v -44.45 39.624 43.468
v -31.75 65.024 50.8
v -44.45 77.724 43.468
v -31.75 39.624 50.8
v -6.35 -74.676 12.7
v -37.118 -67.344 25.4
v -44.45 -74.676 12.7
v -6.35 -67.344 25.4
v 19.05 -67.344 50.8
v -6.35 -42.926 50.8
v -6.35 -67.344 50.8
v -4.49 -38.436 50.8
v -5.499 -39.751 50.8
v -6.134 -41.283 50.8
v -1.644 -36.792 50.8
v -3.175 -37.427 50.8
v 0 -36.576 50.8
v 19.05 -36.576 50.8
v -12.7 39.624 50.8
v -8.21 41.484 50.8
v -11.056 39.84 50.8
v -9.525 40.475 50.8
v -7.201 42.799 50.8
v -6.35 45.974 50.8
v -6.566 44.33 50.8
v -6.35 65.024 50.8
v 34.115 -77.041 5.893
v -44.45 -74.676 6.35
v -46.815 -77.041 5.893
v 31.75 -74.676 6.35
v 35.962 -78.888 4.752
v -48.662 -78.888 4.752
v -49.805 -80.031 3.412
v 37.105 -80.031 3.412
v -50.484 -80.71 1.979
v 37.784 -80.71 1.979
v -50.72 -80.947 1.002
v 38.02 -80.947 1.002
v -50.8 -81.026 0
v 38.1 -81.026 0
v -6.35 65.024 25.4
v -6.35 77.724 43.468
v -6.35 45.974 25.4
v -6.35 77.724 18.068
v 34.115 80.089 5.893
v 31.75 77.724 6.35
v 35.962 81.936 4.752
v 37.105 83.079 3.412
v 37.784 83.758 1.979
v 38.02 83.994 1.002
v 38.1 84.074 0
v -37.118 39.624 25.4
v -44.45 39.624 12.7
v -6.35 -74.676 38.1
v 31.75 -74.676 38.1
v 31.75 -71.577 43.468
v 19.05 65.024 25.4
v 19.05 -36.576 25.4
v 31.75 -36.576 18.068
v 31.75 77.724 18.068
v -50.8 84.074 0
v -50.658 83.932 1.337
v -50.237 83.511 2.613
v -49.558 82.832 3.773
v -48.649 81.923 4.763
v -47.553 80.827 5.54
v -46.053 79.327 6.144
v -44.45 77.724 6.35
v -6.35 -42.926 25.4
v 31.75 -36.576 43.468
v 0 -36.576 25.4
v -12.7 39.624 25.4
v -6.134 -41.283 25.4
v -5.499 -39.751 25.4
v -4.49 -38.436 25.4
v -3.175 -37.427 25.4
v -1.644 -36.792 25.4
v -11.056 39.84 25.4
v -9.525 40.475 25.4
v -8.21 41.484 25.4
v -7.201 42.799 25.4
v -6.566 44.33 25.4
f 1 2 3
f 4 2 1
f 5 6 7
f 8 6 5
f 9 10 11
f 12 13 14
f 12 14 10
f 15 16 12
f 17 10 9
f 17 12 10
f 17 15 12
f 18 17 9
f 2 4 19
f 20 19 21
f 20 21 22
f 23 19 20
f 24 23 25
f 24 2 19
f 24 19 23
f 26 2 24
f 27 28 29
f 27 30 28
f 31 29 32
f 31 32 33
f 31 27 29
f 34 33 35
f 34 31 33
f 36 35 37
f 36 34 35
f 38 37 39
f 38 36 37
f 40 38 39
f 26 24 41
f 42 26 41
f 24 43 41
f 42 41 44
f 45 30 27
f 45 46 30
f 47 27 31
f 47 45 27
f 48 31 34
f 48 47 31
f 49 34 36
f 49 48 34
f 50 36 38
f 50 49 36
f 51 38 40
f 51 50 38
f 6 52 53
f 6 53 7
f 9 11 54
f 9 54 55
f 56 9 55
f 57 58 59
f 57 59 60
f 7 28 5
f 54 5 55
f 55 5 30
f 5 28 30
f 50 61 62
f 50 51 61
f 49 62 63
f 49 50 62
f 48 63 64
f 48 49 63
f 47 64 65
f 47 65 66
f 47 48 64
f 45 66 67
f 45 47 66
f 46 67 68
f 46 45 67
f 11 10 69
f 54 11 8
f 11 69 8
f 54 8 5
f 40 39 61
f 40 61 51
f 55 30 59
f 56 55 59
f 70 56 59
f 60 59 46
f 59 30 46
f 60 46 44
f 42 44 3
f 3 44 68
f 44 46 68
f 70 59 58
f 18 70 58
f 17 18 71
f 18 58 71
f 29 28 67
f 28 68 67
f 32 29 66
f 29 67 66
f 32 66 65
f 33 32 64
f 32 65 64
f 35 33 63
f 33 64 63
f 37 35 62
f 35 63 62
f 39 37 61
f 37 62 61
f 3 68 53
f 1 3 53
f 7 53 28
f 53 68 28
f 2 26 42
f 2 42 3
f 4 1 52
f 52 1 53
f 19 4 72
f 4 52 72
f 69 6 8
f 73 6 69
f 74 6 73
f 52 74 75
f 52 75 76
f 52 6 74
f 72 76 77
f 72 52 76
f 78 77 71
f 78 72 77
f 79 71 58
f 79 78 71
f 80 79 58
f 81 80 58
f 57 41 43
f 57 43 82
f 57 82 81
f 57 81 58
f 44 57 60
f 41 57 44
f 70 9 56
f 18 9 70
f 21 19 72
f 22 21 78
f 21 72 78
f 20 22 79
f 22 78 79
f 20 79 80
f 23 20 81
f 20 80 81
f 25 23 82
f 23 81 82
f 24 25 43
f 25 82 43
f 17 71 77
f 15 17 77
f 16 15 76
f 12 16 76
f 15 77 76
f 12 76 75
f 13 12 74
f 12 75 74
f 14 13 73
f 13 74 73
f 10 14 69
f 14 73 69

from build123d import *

# Parameters (mm, degrees)
F0_W        = 88.9
F0_H        = 165.1
F1_DEPTH    = 6.35
F2_DEPTH    = 25.4
F3_DEPTH    = 50.8
F4_R        = 6.34999
F5_C1_SIZE2 = 12.7
F5_C1_SIZE  = 7.3323484187
F5_C2_SIZE2 = 12.7
F5_C2_SIZE  = 7.3323484187
F5_C3_SIZE2 = 12.7
F5_C3_SIZE  = 7.3323484187
F5_C4_SIZE2 = 12.7
F5_C4_SIZE  = 7.3323484187
F5_C5_SIZE2 = 7.3323484187
F5_C5_SIZE  = 12.7
F5_C6_SIZE2 = 7.3323484187
F5_C6_SIZE  = 12.7
F5_C7_SIZE2 = 12.7
F5_C7_SIZE  = 7.3323484187
F5_C8_SIZE2 = 7.3323484187
F5_C8_SIZE  = 12.7


# Not quite as in the source:
# - a fillet or chamfer is up to 0.001 mm smaller than in the source, because OpenCascade refuses the exact size


with BuildPart() as f1:
    # F0 (on Top) → F1 (new body)
    with BuildSketch(Plane.XY):
        with Locations((-6.35, 1.5239301443)):
            Rectangle(F0_W, F0_H)
        Polygon((-44.45, 39.6239301443), (-44.45, 77.7239301443), (-6.35, 77.7239301443), (31.75, 77.7239301443), (31.75, -36.5760698557), (31.75, -74.6760698557), (-6.35, -74.6760698557), (-44.45, -74.6760698557), align=None, mode=Mode.SUBTRACT)
        with BuildLine():
            Line((31.75, 77.7239301443), (-6.35, 77.7239301443))
            Line((-6.35, 77.7239301443), (-6.35, 45.9739301443))
            ThreePointArc((-6.35, 45.9739301443), (-8.2098719395, 41.4838020838), (-12.7, 39.6239301443))
            Line((-12.7, 39.6239301443), (-44.45, 39.6239301443))
            Line((-44.45, 39.6239301443), (-44.45, -74.6760698557))
            Line((-44.45, -74.6760698557), (-6.35, -74.6760698557))
            Line((-6.35, -74.6760698557), (-6.35, -42.9260698557))
            ThreePointArc((-6.35, -42.9260698557), (-4.4901280605, -38.4359417952), (0, -36.5760698557))
            Line((0, -36.5760698557), (31.75, -36.5760698557))
            Line((31.75, -36.5760698557), (31.75, 77.7239301443))
        make_face()
        with BuildLine():
            Line((-6.35, 77.7239301443), (-44.45, 77.7239301443))
            Line((-44.45, 77.7239301443), (-44.45, 39.6239301443))
            Line((-44.45, 39.6239301443), (-12.7, 39.6239301443))
            ThreePointArc((-12.7, 39.6239301443), (-8.2098719395, 41.4838020838), (-6.35, 45.9739301443))
            Line((-6.35, 45.9739301443), (-6.35, 77.7239301443))
        make_face()
        with BuildLine():
            Line((31.75, -74.6760698557), (31.75, -36.5760698557))
            Line((31.75, -36.5760698557), (0, -36.5760698557))
            ThreePointArc((0, -36.5760698557), (-4.4901280605, -38.4359417952), (-6.35, -42.9260698557))
            Line((-6.35, -42.9260698557), (-6.35, -74.6760698557))
            Line((-6.35, -74.6760698557), (31.75, -74.6760698557))
        make_face()
    extrude(amount=F1_DEPTH)

    # F0 (on Top) → F2 (join)
    with BuildSketch(Plane.XY):
        with BuildLine():
            Line((31.75, 77.7239301443), (-6.35, 77.7239301443))
            Line((-6.35, 77.7239301443), (-6.35, 45.9739301443))
            ThreePointArc((-6.35, 45.9739301443), (-8.2098719395, 41.4838020838), (-12.7, 39.6239301443))
            Line((-12.7, 39.6239301443), (-44.45, 39.6239301443))
            Line((-44.45, 39.6239301443), (-44.45, -74.6760698557))
            Line((-44.45, -74.6760698557), (-6.35, -74.6760698557))
            Line((-6.35, -74.6760698557), (-6.35, -42.9260698557))
            ThreePointArc((-6.35, -42.9260698557), (-4.4901280605, -38.4359417952), (0, -36.5760698557))
            Line((0, -36.5760698557), (31.75, -36.5760698557))
            Line((31.75, -36.5760698557), (31.75, 77.7239301443))
        make_face()
    extrude(amount=F2_DEPTH)

    # F0 (on Top) → F3 (join)
    with BuildSketch(Plane.XY):
        with BuildLine():
            Line((-6.35, 77.7239301443), (-44.45, 77.7239301443))
            Line((-44.45, 77.7239301443), (-44.45, 39.6239301443))
            Line((-44.45, 39.6239301443), (-12.7, 39.6239301443))
            ThreePointArc((-12.7, 39.6239301443), (-8.2098719395, 41.4838020838), (-6.35, 45.9739301443))
            Line((-6.35, 45.9739301443), (-6.35, 77.7239301443))
        make_face()
        with BuildLine():
            Line((31.75, -74.6760698557), (31.75, -36.5760698557))
            Line((31.75, -36.5760698557), (0, -36.5760698557))
            ThreePointArc((0, -36.5760698557), (-4.4901280605, -38.4359417952), (-6.35, -42.9260698557))
            Line((-6.35, -42.9260698557), (-6.35, -74.6760698557))
            Line((-6.35, -74.6760698557), (31.75, -74.6760698557))
        make_face()
    extrude(amount=F3_DEPTH)

    # F4 (radius 6.35 in the source; OpenCascade refuses exactly that, so slightly less here)
    f4_edges = [f1.edges().sort_by_distance(p)[0] for p in [
        (38.1, 1.52393, 6.35),
        (-6.35, -81.02607, 6.35),
        (-6.35, 84.07393, 6.35),
        (-50.8, 1.52393, 6.35),
    ]]
    fillet(f4_edges, radius=F4_R)

    # F5: chamfer of 12.7 x 7.3323484187 on 8 edges, made by hand

    # F5_c1
    f5_c1_edges = [f1.edges().sort_by_distance(p)[0] for p in [
        (12.7, 77.7239301443, 25.4),
    ]]
    f5_c1_side = f1.faces().sort_by_distance((12.7, 77.7239301443, 25.2533530316))[0]
    chamfer(f5_c1_edges, length=F5_C1_SIZE, length2=F5_C1_SIZE2, reference=f5_c1_side)

    # F5_c2
    f5_c2_edges = [f1.edges().sort_by_distance(p)[0] for p in [
        (-25.4, 77.7239301443, 50.8),
    ]]
    f5_c2_side = f1.faces().sort_by_distance((-25.4, 77.7239301443, 50.6533530316))[0]
    chamfer(f5_c2_edges, length=F5_C2_SIZE, length2=F5_C2_SIZE2, reference=f5_c2_side)

    # F5_c3
    f5_c3_edges = [f1.edges().sort_by_distance(p)[0] for p in [
        (31.75, -55.6260698557, 50.8),
    ]]
    f5_c3_side = f1.faces().sort_by_distance((31.75, -55.6260698557, 50.6533530316))[0]
    chamfer(f5_c3_edges, length=F5_C3_SIZE, length2=F5_C3_SIZE2, reference=f5_c3_side)

    # F5_c4
    f5_c4_edges = [f1.edges().sort_by_distance(p)[0] for p in [
        (31.75, 14.2239301443, 25.4),
    ]]
    f5_c4_side = f1.faces().sort_by_distance((31.75, 14.2239301443, 25.2533530316))[0]
    chamfer(f5_c4_edges, length=F5_C4_SIZE, length2=F5_C4_SIZE2, reference=f5_c4_side)

    # F5_c5
    f5_c5_edges = [f1.edges().sort_by_distance(p)[0] for p in [
        (-25.4, -74.6760698557, 25.4),
    ]]
    f5_c5_side = f1.faces().sort_by_distance((-25.4, -74.6760698557, 25.2533530316))[0]
    chamfer(f5_c5_edges, length=F5_C5_SIZE, length2=F5_C5_SIZE2, reference=f5_c5_side)

    # F5_c6
    f5_c6_edges = [f1.edges().sort_by_distance(p)[0] for p in [
        (6.35, -74.6760698557, 50.8),
    ]]
    f5_c6_side = f1.faces().sort_by_distance((6.35, -74.6760698557, 50.6533530316))[0]
    chamfer(f5_c6_edges, length=F5_C6_SIZE, length2=F5_C6_SIZE2, reference=f5_c6_side)

    # F5_c7
    f5_c7_edges = [f1.edges().sort_by_distance(p)[0] for p in [
        (-44.45, 52.3239301443, 50.8),
    ]]
    f5_c7_side = f1.faces().sort_by_distance((-44.45, 52.3239301443, 50.6533530316))[0]
    chamfer(f5_c7_edges, length=F5_C7_SIZE, length2=F5_C7_SIZE2, reference=f5_c7_side)

    # F5_c8
    f5_c8_edges = [f1.edges().sort_by_distance(p)[0] for p in [
        (-44.45, -13.8598956463, 25.4),
    ]]
    f5_c8_side = f1.faces().sort_by_distance((-44.45, -13.8598956463, 25.2533530316))[0]
    chamfer(f5_c8_edges, length=F5_C8_SIZE, length2=F5_C8_SIZE2, reference=f5_c8_side)


solid = f1.part
